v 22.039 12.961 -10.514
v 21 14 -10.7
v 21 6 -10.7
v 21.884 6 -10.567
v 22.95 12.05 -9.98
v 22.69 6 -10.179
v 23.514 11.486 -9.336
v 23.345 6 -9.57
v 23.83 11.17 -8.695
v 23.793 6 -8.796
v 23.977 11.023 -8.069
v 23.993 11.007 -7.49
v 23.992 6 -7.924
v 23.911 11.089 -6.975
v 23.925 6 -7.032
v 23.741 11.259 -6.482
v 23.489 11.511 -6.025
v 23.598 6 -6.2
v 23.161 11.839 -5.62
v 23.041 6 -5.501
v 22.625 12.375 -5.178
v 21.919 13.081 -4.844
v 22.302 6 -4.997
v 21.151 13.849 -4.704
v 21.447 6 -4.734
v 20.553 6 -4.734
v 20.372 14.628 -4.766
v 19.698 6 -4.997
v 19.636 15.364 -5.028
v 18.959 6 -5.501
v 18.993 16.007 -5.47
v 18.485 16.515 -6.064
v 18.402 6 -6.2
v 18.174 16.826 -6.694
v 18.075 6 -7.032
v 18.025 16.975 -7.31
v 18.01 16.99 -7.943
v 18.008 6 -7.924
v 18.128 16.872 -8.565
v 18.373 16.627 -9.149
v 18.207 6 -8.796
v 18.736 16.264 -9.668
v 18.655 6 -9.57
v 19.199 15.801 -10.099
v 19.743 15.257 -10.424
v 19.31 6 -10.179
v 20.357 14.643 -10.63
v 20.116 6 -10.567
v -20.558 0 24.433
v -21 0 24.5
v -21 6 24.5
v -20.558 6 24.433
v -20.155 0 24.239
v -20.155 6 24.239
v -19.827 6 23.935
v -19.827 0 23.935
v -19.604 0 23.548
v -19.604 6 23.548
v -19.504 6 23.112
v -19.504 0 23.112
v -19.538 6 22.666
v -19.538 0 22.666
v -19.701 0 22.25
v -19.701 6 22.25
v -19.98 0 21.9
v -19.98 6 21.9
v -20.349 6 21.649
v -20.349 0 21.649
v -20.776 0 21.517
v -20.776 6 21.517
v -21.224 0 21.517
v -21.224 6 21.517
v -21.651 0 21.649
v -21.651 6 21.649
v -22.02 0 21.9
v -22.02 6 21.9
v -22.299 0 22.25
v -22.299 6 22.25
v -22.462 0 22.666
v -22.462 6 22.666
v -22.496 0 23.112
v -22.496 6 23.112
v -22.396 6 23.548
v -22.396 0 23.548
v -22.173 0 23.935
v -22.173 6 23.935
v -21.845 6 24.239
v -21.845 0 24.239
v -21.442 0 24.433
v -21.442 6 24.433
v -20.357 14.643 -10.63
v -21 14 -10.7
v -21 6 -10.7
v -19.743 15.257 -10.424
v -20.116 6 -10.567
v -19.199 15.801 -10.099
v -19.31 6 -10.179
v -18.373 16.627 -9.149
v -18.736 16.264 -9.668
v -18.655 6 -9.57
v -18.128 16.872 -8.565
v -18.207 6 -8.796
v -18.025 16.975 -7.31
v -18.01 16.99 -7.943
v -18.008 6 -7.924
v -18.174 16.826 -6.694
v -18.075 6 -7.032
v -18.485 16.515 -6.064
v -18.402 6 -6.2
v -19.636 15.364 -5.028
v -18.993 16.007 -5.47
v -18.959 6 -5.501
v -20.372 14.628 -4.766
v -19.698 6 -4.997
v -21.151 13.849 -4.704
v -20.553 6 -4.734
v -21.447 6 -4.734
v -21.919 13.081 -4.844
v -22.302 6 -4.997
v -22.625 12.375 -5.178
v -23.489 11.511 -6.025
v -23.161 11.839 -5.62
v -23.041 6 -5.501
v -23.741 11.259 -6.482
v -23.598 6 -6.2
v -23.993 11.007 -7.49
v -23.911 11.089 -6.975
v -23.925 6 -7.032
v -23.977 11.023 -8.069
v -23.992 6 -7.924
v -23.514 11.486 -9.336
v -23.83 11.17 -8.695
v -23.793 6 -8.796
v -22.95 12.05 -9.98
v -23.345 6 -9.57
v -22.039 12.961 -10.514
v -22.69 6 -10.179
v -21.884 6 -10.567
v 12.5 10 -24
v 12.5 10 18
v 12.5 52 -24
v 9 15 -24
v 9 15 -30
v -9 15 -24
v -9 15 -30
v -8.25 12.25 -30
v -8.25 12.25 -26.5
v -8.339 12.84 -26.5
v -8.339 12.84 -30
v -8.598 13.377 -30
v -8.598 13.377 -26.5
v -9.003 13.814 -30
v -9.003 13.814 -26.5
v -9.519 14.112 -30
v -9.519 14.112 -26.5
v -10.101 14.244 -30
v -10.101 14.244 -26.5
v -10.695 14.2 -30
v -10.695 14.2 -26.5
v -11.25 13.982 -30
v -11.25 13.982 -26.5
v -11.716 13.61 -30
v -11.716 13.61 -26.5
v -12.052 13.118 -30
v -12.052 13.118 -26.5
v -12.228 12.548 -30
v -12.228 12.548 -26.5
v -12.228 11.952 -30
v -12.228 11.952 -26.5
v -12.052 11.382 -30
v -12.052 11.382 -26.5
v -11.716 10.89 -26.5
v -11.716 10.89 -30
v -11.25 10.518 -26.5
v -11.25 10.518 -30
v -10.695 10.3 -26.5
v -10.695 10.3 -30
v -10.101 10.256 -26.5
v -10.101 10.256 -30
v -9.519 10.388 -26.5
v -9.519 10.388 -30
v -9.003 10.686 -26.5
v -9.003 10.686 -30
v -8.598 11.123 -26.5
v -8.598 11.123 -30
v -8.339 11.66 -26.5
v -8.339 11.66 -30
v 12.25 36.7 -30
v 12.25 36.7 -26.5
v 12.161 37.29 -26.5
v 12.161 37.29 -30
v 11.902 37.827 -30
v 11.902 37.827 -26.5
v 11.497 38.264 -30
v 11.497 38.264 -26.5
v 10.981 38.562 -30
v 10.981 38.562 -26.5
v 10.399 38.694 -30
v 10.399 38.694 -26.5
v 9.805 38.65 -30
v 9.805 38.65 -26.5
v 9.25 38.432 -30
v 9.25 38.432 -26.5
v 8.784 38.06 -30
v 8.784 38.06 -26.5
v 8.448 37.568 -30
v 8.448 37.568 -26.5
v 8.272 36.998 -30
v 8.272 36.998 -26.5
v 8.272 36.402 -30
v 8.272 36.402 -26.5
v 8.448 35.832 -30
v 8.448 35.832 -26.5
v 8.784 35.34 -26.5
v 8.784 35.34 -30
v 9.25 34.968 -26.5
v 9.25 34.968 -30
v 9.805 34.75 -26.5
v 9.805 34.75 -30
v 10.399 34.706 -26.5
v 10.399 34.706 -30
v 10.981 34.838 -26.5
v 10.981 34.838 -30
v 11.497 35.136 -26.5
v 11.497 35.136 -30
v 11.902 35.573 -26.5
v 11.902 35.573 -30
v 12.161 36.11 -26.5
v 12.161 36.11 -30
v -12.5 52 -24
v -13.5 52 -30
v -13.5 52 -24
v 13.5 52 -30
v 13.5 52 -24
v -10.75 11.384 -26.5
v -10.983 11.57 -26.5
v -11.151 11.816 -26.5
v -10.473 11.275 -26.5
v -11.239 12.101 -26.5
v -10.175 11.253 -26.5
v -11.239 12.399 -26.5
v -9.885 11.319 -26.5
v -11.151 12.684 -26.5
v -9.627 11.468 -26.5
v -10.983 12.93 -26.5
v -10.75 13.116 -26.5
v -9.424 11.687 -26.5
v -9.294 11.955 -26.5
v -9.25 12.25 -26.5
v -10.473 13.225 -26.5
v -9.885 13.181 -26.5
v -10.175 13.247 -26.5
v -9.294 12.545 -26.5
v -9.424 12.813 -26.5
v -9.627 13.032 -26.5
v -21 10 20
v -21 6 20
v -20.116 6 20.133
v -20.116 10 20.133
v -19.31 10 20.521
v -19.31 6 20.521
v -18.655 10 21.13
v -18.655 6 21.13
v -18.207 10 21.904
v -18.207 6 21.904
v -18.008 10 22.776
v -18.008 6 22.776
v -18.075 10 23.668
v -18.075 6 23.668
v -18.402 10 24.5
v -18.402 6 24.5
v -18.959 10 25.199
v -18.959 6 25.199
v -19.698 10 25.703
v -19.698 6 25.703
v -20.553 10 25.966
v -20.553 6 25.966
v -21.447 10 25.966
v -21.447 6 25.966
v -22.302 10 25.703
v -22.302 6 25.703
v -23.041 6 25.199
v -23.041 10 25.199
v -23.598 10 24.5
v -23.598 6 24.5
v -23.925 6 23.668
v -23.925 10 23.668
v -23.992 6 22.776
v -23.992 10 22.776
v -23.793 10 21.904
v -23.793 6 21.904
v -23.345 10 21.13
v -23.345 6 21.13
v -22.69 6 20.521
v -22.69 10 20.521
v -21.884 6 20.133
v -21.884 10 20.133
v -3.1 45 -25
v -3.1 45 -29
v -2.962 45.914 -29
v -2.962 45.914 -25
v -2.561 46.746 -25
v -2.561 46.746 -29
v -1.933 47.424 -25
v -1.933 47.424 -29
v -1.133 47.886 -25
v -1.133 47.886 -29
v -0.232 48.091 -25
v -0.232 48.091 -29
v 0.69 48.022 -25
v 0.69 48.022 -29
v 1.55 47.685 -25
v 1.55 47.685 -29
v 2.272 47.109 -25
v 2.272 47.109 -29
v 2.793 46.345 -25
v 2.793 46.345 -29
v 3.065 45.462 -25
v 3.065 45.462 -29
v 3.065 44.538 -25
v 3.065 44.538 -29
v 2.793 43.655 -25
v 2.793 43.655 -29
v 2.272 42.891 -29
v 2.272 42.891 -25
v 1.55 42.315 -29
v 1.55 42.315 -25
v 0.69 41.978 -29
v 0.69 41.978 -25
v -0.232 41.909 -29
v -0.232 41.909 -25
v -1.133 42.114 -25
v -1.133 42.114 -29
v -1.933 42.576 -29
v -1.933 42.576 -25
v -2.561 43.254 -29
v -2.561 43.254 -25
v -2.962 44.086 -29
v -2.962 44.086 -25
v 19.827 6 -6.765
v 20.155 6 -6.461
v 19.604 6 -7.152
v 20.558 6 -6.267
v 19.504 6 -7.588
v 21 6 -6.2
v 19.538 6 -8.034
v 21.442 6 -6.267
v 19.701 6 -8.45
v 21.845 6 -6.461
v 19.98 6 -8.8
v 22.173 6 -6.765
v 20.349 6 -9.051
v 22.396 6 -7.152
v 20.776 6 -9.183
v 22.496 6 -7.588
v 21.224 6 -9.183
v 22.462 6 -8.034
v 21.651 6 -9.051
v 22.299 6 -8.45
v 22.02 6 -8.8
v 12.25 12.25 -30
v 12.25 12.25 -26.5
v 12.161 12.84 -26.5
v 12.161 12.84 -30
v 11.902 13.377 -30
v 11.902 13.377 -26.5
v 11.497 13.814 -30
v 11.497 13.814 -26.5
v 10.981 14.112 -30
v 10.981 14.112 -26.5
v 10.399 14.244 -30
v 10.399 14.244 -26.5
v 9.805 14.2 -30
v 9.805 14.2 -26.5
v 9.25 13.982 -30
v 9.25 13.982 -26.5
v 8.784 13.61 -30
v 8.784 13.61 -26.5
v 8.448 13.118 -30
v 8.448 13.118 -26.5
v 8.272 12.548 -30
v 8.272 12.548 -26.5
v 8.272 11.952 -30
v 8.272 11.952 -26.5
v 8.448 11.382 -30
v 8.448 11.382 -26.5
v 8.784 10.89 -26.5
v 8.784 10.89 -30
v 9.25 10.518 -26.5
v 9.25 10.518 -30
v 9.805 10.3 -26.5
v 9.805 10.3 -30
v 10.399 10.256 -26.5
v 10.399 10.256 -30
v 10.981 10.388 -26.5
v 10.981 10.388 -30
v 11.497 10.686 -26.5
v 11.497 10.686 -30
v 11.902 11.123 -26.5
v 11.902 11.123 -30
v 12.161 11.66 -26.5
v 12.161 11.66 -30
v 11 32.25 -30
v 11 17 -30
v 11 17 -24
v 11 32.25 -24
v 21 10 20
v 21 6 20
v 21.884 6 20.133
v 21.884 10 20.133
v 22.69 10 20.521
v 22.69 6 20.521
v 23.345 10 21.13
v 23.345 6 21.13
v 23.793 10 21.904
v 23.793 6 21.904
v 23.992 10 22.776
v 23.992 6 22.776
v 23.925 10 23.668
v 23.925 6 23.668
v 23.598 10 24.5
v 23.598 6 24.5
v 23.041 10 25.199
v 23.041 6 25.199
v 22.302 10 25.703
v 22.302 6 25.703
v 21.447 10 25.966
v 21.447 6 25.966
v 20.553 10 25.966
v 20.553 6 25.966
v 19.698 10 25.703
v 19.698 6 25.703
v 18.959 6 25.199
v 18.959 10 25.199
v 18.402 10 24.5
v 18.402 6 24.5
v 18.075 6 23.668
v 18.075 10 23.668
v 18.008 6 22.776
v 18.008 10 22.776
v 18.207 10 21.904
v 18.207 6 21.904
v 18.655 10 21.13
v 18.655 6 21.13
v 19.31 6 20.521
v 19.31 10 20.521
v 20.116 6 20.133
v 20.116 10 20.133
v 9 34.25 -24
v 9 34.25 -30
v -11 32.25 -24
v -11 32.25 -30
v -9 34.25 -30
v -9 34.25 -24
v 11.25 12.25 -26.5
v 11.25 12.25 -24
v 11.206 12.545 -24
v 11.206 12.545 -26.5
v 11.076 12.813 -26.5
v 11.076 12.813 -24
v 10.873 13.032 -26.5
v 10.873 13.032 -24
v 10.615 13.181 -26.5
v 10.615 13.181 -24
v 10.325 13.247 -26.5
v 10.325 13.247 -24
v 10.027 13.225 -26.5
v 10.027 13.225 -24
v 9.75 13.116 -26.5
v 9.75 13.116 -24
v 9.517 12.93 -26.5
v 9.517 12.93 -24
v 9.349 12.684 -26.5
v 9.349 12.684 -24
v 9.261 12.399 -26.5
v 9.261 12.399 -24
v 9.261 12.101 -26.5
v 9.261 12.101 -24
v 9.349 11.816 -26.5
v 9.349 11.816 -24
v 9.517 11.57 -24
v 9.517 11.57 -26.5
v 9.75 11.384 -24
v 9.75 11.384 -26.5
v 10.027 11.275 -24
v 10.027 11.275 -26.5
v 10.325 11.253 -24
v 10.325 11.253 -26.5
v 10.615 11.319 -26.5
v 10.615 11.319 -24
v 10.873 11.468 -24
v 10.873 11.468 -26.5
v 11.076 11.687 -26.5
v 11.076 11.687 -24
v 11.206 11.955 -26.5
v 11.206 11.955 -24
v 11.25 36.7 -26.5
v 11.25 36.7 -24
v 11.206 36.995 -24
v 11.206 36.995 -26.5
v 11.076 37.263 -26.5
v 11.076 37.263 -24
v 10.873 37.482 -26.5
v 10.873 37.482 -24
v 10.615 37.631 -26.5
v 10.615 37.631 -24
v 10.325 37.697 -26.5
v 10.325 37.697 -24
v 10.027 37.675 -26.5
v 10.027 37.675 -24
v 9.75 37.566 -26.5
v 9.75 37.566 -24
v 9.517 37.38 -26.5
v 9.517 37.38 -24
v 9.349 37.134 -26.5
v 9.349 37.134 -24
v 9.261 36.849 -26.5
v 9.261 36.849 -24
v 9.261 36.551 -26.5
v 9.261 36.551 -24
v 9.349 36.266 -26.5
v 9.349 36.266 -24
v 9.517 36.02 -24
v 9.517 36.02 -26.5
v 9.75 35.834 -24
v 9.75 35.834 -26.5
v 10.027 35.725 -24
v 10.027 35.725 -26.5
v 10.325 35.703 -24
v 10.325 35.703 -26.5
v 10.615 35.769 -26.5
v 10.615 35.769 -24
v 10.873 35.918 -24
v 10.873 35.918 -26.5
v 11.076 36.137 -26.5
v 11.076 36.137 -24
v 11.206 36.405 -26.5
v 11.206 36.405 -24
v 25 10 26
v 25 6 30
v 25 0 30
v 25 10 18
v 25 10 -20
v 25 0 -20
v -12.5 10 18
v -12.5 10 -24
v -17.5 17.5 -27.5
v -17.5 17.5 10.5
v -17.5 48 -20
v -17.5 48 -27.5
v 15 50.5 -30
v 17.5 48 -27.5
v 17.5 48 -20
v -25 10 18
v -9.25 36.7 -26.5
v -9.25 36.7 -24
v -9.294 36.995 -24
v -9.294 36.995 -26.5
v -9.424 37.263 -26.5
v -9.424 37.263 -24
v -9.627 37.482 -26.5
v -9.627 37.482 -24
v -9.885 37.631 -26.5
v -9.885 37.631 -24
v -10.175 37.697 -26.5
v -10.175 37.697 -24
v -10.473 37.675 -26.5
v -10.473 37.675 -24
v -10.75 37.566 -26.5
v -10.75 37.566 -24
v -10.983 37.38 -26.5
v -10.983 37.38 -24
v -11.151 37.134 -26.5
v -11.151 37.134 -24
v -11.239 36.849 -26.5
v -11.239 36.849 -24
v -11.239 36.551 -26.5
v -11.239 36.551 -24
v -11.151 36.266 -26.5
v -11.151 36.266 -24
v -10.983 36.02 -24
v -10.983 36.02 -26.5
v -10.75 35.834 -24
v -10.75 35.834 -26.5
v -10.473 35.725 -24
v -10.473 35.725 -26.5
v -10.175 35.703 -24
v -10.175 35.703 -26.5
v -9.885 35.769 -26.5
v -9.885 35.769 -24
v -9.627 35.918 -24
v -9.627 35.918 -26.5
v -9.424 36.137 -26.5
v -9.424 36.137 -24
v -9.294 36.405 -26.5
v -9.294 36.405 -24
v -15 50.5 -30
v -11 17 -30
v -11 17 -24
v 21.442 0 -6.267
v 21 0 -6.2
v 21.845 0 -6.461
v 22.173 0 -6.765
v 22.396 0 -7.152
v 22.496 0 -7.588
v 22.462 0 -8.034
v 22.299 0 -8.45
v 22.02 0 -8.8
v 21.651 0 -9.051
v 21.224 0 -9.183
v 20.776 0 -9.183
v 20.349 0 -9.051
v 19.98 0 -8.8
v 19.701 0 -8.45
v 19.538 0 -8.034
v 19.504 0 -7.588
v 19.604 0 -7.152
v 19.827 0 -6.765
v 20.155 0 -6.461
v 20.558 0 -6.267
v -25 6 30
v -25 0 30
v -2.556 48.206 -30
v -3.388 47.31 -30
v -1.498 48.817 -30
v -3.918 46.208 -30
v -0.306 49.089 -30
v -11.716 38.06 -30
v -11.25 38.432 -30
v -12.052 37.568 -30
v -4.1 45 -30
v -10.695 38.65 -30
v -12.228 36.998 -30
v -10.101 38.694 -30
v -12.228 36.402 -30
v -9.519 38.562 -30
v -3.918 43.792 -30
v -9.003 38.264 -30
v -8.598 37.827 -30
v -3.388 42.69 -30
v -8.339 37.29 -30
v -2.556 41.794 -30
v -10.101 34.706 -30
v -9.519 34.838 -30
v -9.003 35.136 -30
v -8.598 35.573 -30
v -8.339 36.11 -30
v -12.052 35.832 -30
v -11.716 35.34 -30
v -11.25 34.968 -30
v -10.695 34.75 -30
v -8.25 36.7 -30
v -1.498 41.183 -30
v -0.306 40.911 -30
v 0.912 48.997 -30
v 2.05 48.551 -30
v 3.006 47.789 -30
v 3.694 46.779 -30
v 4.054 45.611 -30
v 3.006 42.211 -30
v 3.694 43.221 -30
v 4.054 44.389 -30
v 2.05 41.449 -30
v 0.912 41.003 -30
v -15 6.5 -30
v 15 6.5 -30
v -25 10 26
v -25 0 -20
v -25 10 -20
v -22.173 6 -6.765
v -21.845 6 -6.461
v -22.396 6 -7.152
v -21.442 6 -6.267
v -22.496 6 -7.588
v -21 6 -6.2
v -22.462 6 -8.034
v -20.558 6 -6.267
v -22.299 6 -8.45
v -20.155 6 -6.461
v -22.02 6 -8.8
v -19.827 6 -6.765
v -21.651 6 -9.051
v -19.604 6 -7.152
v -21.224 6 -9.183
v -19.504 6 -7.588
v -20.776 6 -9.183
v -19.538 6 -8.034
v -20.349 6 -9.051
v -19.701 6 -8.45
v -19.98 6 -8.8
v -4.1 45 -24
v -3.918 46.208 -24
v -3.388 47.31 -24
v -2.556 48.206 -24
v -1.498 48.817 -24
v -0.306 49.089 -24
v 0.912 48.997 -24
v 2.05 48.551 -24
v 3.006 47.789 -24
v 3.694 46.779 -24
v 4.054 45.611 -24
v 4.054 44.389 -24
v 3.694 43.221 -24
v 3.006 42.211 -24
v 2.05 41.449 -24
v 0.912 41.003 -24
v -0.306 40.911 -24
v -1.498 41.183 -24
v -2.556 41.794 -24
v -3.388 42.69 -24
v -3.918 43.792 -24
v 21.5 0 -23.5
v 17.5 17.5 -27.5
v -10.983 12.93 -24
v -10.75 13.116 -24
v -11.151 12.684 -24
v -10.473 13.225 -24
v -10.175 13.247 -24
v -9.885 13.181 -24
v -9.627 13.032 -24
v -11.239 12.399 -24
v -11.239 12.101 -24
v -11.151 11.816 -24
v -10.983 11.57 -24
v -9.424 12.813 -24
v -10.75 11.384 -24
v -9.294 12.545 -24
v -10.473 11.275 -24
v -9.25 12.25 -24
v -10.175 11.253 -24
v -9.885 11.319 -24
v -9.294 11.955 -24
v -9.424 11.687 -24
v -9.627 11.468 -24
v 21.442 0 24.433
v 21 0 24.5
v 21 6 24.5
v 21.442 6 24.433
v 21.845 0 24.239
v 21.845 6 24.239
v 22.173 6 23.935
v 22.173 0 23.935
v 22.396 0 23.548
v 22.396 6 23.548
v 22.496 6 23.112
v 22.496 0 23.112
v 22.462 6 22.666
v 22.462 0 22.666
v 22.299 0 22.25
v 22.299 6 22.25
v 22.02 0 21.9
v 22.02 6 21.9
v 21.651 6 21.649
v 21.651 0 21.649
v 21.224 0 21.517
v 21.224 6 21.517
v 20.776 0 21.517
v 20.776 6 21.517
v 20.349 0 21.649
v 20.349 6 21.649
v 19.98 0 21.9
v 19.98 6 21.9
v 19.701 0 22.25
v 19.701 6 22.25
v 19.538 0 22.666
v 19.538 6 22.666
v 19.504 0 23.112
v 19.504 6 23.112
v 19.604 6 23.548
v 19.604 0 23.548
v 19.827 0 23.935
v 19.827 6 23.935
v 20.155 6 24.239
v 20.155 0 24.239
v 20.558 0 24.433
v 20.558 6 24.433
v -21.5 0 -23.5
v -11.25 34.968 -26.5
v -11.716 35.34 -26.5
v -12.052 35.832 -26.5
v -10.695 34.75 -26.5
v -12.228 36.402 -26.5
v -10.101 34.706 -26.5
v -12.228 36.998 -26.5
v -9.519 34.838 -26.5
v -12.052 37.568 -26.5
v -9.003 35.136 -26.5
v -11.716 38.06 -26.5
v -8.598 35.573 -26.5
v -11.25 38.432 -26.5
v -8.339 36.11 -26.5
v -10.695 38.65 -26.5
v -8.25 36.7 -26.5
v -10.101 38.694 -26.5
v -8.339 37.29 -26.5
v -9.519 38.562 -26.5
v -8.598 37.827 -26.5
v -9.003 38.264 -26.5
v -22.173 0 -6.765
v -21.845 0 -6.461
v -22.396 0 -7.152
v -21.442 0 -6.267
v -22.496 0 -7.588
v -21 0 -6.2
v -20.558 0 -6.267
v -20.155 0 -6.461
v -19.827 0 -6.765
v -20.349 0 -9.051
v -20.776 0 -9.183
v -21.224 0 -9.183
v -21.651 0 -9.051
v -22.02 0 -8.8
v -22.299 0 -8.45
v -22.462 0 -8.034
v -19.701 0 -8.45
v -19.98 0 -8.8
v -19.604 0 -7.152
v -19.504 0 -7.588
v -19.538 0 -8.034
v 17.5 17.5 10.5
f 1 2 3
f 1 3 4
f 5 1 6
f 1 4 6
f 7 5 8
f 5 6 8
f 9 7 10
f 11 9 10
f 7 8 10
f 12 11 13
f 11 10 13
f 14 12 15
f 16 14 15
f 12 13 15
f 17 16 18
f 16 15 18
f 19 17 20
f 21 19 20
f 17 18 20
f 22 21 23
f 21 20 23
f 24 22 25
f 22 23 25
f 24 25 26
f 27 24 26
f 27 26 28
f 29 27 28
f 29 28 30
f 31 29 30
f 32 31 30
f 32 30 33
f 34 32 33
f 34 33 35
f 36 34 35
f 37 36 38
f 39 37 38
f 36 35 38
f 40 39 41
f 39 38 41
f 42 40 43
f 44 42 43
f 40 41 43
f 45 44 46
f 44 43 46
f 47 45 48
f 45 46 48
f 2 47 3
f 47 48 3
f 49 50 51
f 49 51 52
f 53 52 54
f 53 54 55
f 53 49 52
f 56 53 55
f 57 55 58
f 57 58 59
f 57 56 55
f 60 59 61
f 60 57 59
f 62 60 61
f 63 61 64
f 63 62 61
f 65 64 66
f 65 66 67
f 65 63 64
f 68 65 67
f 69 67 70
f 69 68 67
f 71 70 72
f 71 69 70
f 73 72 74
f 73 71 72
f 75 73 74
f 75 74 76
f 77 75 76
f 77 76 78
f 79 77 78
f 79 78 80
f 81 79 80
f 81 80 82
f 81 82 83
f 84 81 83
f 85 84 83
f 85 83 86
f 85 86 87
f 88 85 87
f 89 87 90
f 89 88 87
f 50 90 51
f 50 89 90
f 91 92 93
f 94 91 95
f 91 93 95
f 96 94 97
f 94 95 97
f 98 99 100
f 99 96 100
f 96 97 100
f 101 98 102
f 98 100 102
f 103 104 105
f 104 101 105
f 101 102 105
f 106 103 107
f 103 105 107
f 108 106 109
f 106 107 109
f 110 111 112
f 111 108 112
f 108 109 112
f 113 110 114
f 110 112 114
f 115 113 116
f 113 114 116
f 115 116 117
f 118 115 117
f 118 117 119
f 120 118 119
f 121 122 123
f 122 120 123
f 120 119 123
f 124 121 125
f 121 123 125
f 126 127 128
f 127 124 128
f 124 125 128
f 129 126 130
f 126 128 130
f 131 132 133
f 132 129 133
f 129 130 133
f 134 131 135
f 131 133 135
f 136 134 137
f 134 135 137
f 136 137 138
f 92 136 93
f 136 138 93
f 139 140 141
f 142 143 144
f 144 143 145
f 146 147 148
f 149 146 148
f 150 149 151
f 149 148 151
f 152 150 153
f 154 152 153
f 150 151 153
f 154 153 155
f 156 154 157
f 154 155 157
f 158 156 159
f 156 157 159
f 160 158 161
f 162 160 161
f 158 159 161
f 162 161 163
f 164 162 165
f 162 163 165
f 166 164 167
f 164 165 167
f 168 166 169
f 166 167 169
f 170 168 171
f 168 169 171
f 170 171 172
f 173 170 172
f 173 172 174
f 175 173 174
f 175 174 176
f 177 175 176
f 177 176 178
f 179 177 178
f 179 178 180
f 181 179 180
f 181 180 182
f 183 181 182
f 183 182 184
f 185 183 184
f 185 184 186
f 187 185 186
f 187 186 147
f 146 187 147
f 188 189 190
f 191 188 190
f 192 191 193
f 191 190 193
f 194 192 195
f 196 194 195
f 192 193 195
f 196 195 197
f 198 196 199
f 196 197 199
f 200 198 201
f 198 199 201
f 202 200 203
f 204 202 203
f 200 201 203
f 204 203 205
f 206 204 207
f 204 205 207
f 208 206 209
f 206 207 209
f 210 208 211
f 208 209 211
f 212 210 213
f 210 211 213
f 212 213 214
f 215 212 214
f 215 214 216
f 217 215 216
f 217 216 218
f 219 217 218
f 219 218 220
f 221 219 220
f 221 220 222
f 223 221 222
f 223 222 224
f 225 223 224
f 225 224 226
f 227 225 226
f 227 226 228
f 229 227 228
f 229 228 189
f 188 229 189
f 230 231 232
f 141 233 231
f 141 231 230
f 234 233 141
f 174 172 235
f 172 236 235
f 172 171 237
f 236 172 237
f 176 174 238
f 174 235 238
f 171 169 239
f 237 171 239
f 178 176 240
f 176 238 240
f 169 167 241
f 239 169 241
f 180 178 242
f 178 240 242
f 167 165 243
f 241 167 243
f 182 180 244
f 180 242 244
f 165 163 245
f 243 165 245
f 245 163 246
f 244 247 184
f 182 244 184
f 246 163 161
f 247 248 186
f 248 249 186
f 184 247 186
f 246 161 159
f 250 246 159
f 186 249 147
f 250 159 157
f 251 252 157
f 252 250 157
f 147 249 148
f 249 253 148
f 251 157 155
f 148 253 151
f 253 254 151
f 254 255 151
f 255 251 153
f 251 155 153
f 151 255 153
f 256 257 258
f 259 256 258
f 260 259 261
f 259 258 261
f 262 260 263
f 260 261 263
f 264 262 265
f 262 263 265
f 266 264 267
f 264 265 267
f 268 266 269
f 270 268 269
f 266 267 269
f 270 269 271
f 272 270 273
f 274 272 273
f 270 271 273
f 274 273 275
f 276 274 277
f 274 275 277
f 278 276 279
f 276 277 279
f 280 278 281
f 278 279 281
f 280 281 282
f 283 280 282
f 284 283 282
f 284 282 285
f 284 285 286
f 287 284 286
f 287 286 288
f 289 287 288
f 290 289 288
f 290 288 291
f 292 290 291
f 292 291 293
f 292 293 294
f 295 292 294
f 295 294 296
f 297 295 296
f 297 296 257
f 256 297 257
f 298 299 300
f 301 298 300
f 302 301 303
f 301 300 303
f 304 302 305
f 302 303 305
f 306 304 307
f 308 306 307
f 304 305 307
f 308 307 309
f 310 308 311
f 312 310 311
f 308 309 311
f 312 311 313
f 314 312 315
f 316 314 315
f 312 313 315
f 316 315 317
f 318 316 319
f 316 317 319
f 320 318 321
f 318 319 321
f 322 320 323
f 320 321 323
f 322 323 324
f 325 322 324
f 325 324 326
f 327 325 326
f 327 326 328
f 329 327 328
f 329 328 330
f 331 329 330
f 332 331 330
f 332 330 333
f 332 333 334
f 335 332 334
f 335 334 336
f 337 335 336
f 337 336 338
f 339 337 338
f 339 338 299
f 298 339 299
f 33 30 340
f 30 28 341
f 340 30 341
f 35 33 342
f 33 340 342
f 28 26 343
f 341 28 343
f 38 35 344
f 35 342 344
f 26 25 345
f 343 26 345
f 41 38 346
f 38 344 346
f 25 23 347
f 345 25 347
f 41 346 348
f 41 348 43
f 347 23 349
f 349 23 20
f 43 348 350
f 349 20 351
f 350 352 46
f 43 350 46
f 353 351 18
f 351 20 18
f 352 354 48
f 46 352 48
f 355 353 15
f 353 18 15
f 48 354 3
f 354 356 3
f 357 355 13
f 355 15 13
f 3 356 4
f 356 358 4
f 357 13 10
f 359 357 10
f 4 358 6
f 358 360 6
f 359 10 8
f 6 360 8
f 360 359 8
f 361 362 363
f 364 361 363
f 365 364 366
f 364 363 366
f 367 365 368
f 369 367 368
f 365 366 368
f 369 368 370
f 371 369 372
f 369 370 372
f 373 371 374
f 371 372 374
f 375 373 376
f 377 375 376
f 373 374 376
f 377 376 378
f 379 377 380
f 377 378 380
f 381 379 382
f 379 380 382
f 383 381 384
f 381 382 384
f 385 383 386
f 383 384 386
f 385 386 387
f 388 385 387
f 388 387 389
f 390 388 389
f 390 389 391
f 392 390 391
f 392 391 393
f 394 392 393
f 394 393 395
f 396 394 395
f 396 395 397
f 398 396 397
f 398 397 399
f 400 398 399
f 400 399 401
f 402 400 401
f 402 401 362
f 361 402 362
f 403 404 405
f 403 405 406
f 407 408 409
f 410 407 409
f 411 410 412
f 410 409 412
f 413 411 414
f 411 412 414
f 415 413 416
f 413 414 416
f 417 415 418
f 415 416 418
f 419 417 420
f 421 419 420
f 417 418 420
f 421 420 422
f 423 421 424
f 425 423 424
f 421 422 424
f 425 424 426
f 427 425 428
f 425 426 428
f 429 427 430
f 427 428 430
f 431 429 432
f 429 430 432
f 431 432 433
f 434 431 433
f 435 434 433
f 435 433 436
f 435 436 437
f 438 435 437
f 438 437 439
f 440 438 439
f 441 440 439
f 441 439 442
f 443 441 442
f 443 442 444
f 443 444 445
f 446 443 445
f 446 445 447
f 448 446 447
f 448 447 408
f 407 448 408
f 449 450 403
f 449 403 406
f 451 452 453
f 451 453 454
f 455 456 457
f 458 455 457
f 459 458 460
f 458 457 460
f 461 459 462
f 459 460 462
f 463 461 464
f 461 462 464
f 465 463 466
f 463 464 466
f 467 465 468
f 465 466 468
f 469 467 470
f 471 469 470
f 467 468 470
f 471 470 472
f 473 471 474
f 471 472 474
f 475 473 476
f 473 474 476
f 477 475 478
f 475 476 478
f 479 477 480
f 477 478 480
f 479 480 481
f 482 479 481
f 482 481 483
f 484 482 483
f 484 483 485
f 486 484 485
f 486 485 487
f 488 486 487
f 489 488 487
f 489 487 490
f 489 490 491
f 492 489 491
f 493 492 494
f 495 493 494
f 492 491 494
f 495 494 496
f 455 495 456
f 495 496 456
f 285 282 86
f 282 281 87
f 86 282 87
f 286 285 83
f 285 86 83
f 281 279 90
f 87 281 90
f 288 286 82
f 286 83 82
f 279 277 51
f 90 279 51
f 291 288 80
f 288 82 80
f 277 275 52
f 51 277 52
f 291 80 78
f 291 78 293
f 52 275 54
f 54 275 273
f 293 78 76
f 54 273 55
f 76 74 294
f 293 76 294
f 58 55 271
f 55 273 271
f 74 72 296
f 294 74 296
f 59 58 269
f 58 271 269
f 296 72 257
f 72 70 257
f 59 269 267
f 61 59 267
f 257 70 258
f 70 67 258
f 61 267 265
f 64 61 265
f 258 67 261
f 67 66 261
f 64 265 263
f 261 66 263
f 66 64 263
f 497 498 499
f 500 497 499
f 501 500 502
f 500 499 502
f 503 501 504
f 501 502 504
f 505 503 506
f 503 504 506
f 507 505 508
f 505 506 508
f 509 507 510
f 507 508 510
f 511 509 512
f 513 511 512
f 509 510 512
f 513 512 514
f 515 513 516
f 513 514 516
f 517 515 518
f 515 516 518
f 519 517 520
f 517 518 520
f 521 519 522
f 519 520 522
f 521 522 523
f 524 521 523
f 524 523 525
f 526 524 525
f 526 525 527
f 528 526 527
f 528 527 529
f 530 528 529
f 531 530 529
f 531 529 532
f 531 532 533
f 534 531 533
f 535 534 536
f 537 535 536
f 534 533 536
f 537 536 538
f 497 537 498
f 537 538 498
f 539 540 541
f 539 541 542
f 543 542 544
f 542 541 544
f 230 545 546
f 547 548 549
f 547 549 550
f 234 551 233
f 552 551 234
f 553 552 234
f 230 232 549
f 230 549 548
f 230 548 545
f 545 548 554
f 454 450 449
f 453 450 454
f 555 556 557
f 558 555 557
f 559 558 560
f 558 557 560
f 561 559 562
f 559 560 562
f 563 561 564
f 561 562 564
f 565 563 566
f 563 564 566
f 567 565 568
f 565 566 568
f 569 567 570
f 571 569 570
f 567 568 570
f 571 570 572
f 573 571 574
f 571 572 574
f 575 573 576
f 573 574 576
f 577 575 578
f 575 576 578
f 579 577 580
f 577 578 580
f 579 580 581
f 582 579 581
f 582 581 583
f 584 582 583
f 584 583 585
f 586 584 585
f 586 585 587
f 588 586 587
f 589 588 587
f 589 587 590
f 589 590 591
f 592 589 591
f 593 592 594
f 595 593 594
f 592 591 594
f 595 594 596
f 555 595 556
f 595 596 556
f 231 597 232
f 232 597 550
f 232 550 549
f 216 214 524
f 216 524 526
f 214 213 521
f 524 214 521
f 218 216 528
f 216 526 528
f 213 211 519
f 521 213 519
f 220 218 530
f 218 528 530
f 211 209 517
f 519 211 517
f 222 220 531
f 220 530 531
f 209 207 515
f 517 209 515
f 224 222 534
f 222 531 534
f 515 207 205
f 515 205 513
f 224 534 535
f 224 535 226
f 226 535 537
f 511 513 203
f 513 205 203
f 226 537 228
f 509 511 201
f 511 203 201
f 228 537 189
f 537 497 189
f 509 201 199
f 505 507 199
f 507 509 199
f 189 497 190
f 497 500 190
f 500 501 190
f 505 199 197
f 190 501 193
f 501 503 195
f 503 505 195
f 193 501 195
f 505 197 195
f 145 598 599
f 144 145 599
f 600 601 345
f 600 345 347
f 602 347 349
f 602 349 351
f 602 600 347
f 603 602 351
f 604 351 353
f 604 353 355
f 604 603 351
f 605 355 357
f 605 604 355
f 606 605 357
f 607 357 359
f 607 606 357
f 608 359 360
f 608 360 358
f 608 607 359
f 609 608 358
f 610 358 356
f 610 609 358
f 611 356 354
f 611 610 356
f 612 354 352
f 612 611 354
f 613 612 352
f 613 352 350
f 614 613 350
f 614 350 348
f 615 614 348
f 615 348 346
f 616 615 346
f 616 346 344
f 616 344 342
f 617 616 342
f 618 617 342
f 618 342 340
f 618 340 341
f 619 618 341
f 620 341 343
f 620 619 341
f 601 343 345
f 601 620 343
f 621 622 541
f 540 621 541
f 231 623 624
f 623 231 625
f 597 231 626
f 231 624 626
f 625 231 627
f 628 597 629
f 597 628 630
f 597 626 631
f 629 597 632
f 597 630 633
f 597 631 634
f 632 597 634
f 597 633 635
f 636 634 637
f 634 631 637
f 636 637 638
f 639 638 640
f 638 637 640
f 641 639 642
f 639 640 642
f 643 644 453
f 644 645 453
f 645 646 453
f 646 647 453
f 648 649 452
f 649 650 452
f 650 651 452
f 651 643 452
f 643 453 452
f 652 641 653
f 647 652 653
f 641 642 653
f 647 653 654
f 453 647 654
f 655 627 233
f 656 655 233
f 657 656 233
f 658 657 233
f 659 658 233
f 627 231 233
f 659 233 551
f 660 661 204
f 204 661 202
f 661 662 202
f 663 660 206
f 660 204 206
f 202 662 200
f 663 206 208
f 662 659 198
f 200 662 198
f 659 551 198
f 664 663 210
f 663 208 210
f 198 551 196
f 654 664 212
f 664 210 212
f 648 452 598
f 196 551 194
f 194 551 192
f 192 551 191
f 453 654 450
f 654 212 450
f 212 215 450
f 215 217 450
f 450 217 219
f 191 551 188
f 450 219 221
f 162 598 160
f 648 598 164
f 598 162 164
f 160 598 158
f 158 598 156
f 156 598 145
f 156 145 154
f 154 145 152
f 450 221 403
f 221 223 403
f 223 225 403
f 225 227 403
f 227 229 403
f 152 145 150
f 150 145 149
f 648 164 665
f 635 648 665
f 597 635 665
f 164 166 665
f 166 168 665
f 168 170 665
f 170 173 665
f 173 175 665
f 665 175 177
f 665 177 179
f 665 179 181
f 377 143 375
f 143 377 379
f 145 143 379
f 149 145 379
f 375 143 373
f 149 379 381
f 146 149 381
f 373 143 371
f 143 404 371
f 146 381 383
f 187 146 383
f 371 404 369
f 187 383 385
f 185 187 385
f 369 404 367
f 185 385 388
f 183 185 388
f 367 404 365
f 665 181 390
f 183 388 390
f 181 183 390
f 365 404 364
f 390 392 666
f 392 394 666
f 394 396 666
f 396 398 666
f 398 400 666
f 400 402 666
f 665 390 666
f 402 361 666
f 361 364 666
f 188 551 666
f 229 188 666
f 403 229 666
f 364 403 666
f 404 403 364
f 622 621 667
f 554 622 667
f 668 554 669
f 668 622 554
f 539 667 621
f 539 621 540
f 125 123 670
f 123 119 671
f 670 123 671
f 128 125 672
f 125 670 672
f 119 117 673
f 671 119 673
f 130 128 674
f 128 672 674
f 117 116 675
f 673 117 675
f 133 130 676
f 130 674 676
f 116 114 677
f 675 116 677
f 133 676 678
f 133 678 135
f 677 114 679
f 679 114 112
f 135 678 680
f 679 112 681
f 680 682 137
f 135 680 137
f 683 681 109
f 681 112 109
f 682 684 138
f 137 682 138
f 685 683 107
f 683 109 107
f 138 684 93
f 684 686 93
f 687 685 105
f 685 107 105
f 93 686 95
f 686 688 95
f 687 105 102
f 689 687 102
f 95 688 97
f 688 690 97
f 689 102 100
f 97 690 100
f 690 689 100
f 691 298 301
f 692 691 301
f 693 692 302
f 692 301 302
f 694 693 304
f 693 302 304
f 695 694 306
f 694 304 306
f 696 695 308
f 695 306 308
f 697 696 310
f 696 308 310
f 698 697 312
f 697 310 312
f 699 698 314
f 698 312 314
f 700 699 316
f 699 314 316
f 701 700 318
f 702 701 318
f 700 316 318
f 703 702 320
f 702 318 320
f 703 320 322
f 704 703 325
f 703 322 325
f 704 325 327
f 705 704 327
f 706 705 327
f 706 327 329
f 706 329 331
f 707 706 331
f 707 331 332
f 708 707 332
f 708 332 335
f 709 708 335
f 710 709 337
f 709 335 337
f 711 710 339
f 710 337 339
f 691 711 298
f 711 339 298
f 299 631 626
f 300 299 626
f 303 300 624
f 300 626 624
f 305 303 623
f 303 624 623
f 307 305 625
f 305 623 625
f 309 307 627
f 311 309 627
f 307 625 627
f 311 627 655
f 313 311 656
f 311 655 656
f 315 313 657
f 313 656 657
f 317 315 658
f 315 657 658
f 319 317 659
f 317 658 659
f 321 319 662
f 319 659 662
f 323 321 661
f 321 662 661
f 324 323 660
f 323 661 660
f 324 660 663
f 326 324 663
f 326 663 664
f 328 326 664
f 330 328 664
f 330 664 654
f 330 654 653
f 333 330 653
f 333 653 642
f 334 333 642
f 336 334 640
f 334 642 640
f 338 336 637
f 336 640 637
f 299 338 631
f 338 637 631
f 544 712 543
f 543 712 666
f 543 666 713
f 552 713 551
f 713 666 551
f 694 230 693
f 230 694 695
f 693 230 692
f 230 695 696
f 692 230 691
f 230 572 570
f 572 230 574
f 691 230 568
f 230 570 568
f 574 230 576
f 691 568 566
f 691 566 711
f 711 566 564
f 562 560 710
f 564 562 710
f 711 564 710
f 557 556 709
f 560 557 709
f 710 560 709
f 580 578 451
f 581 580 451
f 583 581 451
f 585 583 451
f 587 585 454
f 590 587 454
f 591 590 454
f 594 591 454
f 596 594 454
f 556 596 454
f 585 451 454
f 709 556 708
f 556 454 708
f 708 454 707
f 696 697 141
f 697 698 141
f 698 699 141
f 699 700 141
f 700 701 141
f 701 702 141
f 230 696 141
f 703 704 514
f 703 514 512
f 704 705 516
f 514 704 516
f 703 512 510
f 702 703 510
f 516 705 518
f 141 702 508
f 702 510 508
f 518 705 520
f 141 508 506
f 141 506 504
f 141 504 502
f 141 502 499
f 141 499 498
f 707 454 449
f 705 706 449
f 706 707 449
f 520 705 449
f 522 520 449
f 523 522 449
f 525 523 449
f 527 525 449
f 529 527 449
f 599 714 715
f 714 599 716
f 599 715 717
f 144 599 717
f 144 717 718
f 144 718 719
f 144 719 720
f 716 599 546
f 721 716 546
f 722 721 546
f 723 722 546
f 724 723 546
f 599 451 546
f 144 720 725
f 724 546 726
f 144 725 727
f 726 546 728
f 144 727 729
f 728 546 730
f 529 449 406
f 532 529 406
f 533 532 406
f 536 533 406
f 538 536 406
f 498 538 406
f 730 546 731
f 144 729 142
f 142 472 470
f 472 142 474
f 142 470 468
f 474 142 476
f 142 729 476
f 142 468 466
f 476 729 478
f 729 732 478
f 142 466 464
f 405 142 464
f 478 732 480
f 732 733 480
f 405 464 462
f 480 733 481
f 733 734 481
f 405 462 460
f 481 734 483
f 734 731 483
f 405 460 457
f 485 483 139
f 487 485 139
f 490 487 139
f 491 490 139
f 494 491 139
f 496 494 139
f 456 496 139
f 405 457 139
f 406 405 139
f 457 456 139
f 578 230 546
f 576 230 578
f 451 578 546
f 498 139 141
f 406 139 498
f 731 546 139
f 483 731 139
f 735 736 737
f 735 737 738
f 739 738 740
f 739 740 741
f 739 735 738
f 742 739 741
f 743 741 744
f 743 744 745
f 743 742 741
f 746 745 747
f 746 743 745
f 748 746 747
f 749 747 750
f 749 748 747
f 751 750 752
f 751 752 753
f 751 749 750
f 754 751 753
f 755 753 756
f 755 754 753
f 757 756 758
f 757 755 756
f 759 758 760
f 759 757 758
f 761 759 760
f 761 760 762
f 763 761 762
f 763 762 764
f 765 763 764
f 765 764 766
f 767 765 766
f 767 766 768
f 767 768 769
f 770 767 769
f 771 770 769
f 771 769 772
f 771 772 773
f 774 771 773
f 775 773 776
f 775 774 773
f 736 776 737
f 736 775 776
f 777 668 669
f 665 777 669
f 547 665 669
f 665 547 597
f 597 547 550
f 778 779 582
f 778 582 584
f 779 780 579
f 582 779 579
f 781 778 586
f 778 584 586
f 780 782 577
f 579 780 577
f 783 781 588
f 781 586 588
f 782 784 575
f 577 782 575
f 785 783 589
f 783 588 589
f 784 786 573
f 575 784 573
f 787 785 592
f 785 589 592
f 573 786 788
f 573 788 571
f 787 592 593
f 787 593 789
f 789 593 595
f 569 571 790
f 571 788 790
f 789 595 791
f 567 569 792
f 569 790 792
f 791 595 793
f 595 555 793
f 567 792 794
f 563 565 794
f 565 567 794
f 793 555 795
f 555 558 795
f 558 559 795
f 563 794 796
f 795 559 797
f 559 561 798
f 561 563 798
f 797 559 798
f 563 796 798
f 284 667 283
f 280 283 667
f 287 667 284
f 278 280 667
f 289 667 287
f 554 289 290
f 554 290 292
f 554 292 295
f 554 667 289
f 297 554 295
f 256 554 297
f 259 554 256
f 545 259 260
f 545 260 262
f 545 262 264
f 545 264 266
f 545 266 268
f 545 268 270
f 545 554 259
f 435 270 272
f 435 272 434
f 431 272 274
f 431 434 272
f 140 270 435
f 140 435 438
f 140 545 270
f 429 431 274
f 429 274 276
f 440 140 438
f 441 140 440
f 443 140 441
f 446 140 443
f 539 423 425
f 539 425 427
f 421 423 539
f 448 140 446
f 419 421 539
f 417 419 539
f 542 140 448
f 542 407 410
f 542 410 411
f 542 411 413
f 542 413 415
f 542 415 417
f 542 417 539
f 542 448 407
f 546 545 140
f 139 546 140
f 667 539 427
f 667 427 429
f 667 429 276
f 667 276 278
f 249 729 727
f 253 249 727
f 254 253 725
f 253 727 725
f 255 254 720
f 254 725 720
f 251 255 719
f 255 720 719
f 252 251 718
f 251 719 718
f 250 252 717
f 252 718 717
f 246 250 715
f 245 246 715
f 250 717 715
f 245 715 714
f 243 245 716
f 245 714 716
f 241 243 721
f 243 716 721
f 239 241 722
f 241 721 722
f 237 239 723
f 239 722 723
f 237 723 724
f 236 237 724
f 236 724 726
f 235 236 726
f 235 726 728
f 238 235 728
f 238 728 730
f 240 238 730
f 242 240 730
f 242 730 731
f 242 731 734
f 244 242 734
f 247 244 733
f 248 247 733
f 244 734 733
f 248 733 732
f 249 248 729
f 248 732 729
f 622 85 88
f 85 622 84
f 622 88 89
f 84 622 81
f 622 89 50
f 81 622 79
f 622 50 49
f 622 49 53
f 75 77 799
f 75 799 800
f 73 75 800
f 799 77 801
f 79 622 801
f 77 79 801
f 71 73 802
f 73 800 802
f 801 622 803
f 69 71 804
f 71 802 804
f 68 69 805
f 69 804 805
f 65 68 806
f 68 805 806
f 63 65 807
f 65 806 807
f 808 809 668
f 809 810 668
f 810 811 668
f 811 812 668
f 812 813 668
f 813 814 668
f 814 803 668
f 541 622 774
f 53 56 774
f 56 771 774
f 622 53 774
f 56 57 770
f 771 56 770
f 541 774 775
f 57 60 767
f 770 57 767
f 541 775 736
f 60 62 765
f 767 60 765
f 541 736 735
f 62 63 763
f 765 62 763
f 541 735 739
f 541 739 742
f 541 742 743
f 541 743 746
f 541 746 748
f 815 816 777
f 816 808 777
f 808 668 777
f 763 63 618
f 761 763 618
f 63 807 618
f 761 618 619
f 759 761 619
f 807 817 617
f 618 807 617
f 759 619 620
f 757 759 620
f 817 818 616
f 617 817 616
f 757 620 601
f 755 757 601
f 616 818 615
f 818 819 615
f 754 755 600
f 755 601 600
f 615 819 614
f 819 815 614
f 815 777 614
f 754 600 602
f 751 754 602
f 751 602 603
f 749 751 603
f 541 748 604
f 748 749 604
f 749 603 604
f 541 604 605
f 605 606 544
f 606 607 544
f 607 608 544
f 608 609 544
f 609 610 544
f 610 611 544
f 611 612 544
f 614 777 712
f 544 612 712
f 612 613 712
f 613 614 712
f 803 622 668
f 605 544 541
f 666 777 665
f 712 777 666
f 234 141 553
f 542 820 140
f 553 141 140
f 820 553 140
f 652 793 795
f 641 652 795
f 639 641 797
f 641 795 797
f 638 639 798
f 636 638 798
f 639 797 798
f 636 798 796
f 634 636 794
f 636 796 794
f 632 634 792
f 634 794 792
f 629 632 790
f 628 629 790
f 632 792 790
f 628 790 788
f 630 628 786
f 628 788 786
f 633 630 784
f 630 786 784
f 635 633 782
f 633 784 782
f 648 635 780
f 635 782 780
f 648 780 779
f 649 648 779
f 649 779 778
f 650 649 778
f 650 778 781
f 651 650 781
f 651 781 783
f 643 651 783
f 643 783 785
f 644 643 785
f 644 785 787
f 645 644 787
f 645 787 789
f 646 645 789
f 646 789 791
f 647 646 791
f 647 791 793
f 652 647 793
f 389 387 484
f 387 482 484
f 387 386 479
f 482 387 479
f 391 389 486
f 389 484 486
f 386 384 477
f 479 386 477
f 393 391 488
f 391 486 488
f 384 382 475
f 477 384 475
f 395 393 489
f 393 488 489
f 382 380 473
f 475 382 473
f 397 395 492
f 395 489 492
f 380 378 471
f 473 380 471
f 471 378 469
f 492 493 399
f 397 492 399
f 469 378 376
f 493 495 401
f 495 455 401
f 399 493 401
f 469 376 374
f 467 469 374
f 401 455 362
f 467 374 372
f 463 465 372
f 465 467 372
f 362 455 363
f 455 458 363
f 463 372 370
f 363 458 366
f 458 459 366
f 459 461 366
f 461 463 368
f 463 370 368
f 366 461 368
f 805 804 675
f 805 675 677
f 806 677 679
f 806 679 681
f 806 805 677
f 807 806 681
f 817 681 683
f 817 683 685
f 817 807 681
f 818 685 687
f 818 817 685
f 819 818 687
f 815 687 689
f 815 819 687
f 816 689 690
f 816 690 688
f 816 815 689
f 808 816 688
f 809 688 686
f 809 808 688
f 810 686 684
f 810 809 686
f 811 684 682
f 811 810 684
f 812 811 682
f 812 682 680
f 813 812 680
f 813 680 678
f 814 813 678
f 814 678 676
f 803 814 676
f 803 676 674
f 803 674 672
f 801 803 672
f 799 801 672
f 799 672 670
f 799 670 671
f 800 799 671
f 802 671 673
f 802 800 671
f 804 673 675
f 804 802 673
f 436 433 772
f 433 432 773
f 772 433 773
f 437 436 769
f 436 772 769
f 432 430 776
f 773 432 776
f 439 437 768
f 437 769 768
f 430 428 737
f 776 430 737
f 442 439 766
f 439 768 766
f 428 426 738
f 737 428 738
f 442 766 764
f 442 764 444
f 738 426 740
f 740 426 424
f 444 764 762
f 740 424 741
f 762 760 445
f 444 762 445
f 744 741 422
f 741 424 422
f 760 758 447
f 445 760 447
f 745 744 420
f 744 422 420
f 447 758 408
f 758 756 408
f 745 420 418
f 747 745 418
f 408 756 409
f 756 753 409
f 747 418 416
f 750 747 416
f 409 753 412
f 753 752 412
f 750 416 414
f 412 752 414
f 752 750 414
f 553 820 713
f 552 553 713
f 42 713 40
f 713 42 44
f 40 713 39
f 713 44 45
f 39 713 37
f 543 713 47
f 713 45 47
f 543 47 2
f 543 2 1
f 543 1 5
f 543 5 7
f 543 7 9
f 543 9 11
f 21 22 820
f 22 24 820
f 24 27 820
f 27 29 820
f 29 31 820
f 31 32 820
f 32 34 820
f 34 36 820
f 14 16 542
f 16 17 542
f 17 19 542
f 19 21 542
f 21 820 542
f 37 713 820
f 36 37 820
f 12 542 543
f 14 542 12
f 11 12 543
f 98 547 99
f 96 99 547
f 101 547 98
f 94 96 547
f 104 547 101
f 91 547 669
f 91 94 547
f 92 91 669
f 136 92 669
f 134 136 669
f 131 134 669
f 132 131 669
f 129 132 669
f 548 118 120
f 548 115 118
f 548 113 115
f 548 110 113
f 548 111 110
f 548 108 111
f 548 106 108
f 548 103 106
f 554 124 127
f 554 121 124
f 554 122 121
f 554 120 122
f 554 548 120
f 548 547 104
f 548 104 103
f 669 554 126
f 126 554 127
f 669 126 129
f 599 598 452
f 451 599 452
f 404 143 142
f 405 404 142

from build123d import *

# Parameters (mm, degrees)
SKETCH1_W           = 50
SKETCH1_H           = 60
BOSS_EXTRUDE1_DEPTH = 10
SKETCH2_R           = 1.5
CUT_EXTRUDE1_DEPTH  = 6
CUT_EXTRUDE2_REACH  = 41.509
SKETCH3_R           = 3
SKETCH5_W           = 25
SKETCH5_H           = 6
BOSS_EXTRUDE3_DEPTH = 42
CUT_EXTRUDE3_REACH  = 85.241
SKETCH6_W           = 22
SKETCH6_H           = 19.25
SKETCH7_R           = 1
CUT_EXTRUDE4_DEPTH  = 2.5
CUT_EXTRUDE5_REACH  = 82.754
SKETCH8_R           = 2
BOSS_EXTRUDE4_DEPTH = 5
CHAMFER1_SIZE       = 7.5
CHAMFER2_SIZE       = 10
CHAMFER4_SIZE       = 6.5
CHAMFER5_SIZE       = 4
CHAMFER6_SIZE       = 4
CHAMFER7_SIZE       = 2
CUT_EXTRUDE6_REACH  = 85.241
SKETCH10_R          = 3.1
CHAMFER8_SIZE       = 1


# Some blends are built 0.0001 mm under size
with BuildPart() as part:
    # Sketch1 → Boss-Extrude1 (new body)
    with BuildSketch(Plane(origin=(0, 0, 0), x_dir=(1, 0, 0), z_dir=(0, 1, 0))):
        Rectangle(SKETCH1_W, SKETCH1_H)
    extrude(amount=BOSS_EXTRUDE1_DEPTH)

    # Sketch2 → Cut-Extrude1 (cut)
    with BuildSketch(Plane(origin=(0, 0, 0), x_dir=(1, 0, 0), z_dir=(0, 1, 0))):
        with Locations(Location((-21, 7.7, 0), (0, 0, 270))):
            Circle(SKETCH2_R)
        with Locations(Location((-21, -23, 0), (0, 0, 270))):
            Circle(SKETCH2_R)
        with Locations(Location((21, 7.7, 0), (0, 0, 270))):
            Circle(SKETCH2_R)
        with Locations(Location((21, -23, 0), (0, 0, 270))):
            Circle(SKETCH2_R)
    extrude(amount=CUT_EXTRUDE1_DEPTH, mode=Mode.SUBTRACT)

    # Sketch3 → Cut-Extrude2 (cut, up to next)
    with BuildSketch(Plane.XZ.offset(-6), mode=Mode.PRIVATE) as cut_extrude2_sk1:
        with Locations(Location((-21, 23, 0), (0, 0, 270))):
            Circle(SKETCH3_R)
    cut_extrude2_tool1 = extrude(cut_extrude2_sk1.sketch, amount=-CUT_EXTRUDE2_REACH, mode=Mode.PRIVATE) & part.part
    # Sketch3 → Cut-Extrude2 (cut, up to next)
    with BuildSketch(Plane.XZ.offset(-6), mode=Mode.PRIVATE) as cut_extrude2_sk2:
        with Locations(Location((21, 23, 0), (0, 0, 270))):
            Circle(SKETCH3_R)
    cut_extrude2_tool2 = extrude(cut_extrude2_sk2.sketch, amount=-CUT_EXTRUDE2_REACH, mode=Mode.PRIVATE) & part.part
    # Sketch3 → Cut-Extrude2 (cut, up to next)
    with BuildSketch(Plane.XZ.offset(-6), mode=Mode.PRIVATE) as cut_extrude2_sk3:
        with Locations(Location((21, -7.7, 0), (0, 0, 270))):
            Circle(SKETCH3_R)
    cut_extrude2_tool3 = extrude(cut_extrude2_sk3.sketch, amount=-CUT_EXTRUDE2_REACH, mode=Mode.PRIVATE) & part.part
    # Sketch3 → Cut-Extrude2 (cut, up to next)
    with BuildSketch(Plane.XZ.offset(-6), mode=Mode.PRIVATE) as cut_extrude2_sk4:
        with Locations(Location((-21, -7.7, 0), (0, 0, 270))):
            Circle(SKETCH3_R)
    cut_extrude2_tool4 = extrude(cut_extrude2_sk4.sketch, amount=-CUT_EXTRUDE2_REACH, mode=Mode.PRIVATE) & part.part
    add(cut_extrude2_tool1.solids().sort_by_distance((-21, 6, 23))[0], mode=Mode.SUBTRACT)
    add(cut_extrude2_tool2.solids().sort_by_distance((21, 6, 23))[0], mode=Mode.SUBTRACT)
    add(cut_extrude2_tool3.solids().sort_by_distance((21, 6, -7.7))[0], mode=Mode.SUBTRACT)
    add(cut_extrude2_tool4.solids().sort_by_distance((-21, 6, -7.7))[0], mode=Mode.SUBTRACT)

    # Sketch5 → Boss-Extrude3 (add)
    with BuildSketch(Plane(origin=(0, 10, 0), x_dir=(1, 0, 0), z_dir=(0, 1, 0))):
        with Locations((0, 27)):
            Rectangle(SKETCH5_W, SKETCH5_H)
    extrude(amount=BOSS_EXTRUDE3_DEPTH)

    # Sketch6 → Cut-Extrude3 (cut, up to next)
    with BuildSketch(Plane(origin=(0, 0, -30), x_dir=(-1, 0, 0), z_dir=(0, 0, -1)), mode=Mode.PRIVATE) as cut_extrude3_sk1:
        with Locations((0, 24.625)):
            Rectangle(SKETCH6_W, SKETCH6_H)
    cut_extrude3_tool1 = extrude(cut_extrude3_sk1.sketch, amount=-CUT_EXTRUDE3_REACH, mode=Mode.PRIVATE) & part.part
    add(cut_extrude3_tool1.solids().sort_by_distance((0, 24.625, -30))[0], mode=Mode.SUBTRACT)

    # Sketch7 → Cut-Extrude4 (cut)
    with BuildSketch(Plane.XY.offset(-24)):
        with Locations((10.25, 12.25)):
            Circle(SKETCH7_R)
        with Locations((-10.25, 12.25)):
            Circle(SKETCH7_R)
        with Locations((-10.25, 36.7)):
            Circle(SKETCH7_R)
        with Locations((10.25, 36.7)):
            Circle(SKETCH7_R)
    extrude(amount=-CUT_EXTRUDE4_DEPTH, mode=Mode.SUBTRACT)

    # Sketch8 → Cut-Extrude5 (cut, up to next)
    with BuildSketch(Plane.XY.offset(-26.5), mode=Mode.PRIVATE) as cut_extrude5_sk1:
        with Locations((-10.25, 36.7)):
            Circle(SKETCH8_R)
    cut_extrude5_tool1 = extrude(cut_extrude5_sk1.sketch, amount=-CUT_EXTRUDE5_REACH, mode=Mode.PRIVATE) & part.part
    # Sketch8 → Cut-Extrude5 (cut, up to next)
    with BuildSketch(Plane.XY.offset(-26.5), mode=Mode.PRIVATE) as cut_extrude5_sk2:
        with Locations((10.25, 36.7)):
            Circle(SKETCH8_R)
    cut_extrude5_tool2 = extrude(cut_extrude5_sk2.sketch, amount=-CUT_EXTRUDE5_REACH, mode=Mode.PRIVATE) & part.part
    # Sketch8 → Cut-Extrude5 (cut, up to next)
    with BuildSketch(Plane.XY.offset(-26.5), mode=Mode.PRIVATE) as cut_extrude5_sk3:
        with Locations((10.25, 12.25)):
            Circle(SKETCH8_R)
    cut_extrude5_tool3 = extrude(cut_extrude5_sk3.sketch, amount=-CUT_EXTRUDE5_REACH, mode=Mode.PRIVATE) & part.part
    # Sketch8 → Cut-Extrude5 (cut, up to next)
    with BuildSketch(Plane.XY.offset(-26.5), mode=Mode.PRIVATE) as cut_extrude5_sk4:
        with Locations((-10.25, 12.25)):
            Circle(SKETCH8_R)
    cut_extrude5_tool4 = extrude(cut_extrude5_sk4.sketch, amount=-CUT_EXTRUDE5_REACH, mode=Mode.PRIVATE) & part.part
    add(cut_extrude5_tool1.solids().sort_by_distance((-10.25, 36.7, -26.5))[0], mode=Mode.SUBTRACT)
    add(cut_extrude5_tool2.solids().sort_by_distance((10.25, 36.7, -26.5))[0], mode=Mode.SUBTRACT)
    add(cut_extrude5_tool3.solids().sort_by_distance((10.25, 12.25, -26.5))[0], mode=Mode.SUBTRACT)
    add(cut_extrude5_tool4.solids().sort_by_distance((-10.25, 12.25, -26.5))[0], mode=Mode.SUBTRACT)

    # Sketch9 → Boss-Extrude4 (add)
    with BuildSketch(Plane(origin=(12.5, 0, 0), x_dir=(0, 0, -1), z_dir=(1, 0, 0))):
        Polygon((30, 52), (24, 52), (-18, 10), (30, 10), align=None)
    boss_extrude4 = extrude(amount=BOSS_EXTRUDE4_DEPTH)

    # Mirror1: Boss-Extrude4 across plane
    add(boss_extrude4.mirror(Plane(origin=(0, 0, 0), x_dir=(0, 0, 1), z_dir=(1, 0, 0))))

    # Chamfer1
    # the kernel refuses this chamfer: 7.5 mm, written as the material it adds along each edge
    with BuildSketch(Plane(origin=(17.5, 10, 37.28762241), x_dir=(-0.02749587661058632, 0.9996219169112968, 0), z_dir=(0, 0, -1))) as chamfer1_piece_1_section:
        Polygon((CHAMFER1_SIZE * 0.999621916911, CHAMFER1_SIZE * 0.0274958766106), (-CHAMFER1_SIZE * 0.0274958766106, CHAMFER1_SIZE * 0.999621916911), (0, 0), align=None)
    chamfer1_piece_1 = extrude(amount=67.28762241, mode=Mode.PRIVATE)
    chamfer1_piece_1 = split(chamfer1_piece_1, bisect_by=Plane(origin=(18.496268946, 33.174911168, -5.174911168), z_dir=(0, -0.7071067811865462, -0.7071067811865489)), keep=Keep.TOP, mode=Mode.PRIVATE)
    chamfer1_piece_1 = chamfer1_piece_1 - Plane(origin=(21, 16.349822336, -7.7), x_dir=(0, 0, -1), z_dir=(0, -1, 0)) * Cylinder(3, 165, mode=Mode.PRIVATE)
    chamfer1_piece_1 = split(chamfer1_piece_1, bisect_by=Plane(origin=(25, 16.349822336, -22), z_dir=(-1, 0, 0)), keep=Keep.TOP, mode=Mode.PRIVATE)
    add(chamfer1_piece_1)
    with BuildSketch(Plane(origin=(-17.5, 10, 37.28762241), x_dir=(0.02749587661058632, 0.9996219169112968, 0), z_dir=(0, 0, -1))) as chamfer1_piece_2_section:
        Polygon((CHAMFER1_SIZE * 0.999621916911, -CHAMFER1_SIZE * 0.0274958766106), (-CHAMFER1_SIZE * 0.0274958766106, -CHAMFER1_SIZE * 0.999621916911), (0, 0), align=None)
    chamfer1_piece_2 = extrude(amount=67.28762241, mode=Mode.PRIVATE)
    chamfer1_piece_2 = split(chamfer1_piece_2, bisect_by=Plane(origin=(-18.49626887, 33.174911131, -5.174911131), z_dir=(0, -0.7071067811865462, -0.7071067811865489)), keep=Keep.TOP, mode=Mode.PRIVATE)
    chamfer1_piece_2 = chamfer1_piece_2 - Plane(origin=(-21, 16.349822261, -7.7), x_dir=(0, 0, -1), z_dir=(0, -1, 0)) * Cylinder(3, 165, mode=Mode.PRIVATE)
    chamfer1_piece_2 = split(chamfer1_piece_2, bisect_by=Plane(origin=(-25, 16.349822261, -22), z_dir=(1, 0, 0)), keep=Keep.TOP, mode=Mode.PRIVATE)
    add(chamfer1_piece_2)

    # Chamfer2
    chamfer2_edges = [part.edges().sort_by_distance(p)[0] for p in [
        (-25, 5, -30),
        (25, 5, -30),
    ]]
    chamfer(chamfer2_edges, length=CHAMFER2_SIZE)

    # Chamfer4
    chamfer4_edges = [part.edges().sort_by_distance(p)[0] for p in [
        (0, 0, -30),
    ]]
    chamfer(chamfer4_edges, length=CHAMFER4_SIZE)

    # Chamfer5
    chamfer5_edges = [part.edges().sort_by_distance(p)[0] for p in [
        (17.5, 52, -25.75),
        (-17.5, 52, -25.75),
    ]]
    chamfer(chamfer5_edges, length=CHAMFER5_SIZE)

    # Chamfer6
    chamfer6_edges = [part.edges().sort_by_distance(p)[0] for p in [
        (0, 10, 30),
    ]]
    chamfer(chamfer6_edges, length=CHAMFER6_SIZE - 0.0001)  # a hair under: the kernel refuses the full size

    # Chamfer7
    chamfer7_edges = [part.edges().sort_by_distance(p)[0] for p in [
        (-11, 34.25, -27),
        (-11, 15, -27),
        (11, 15, -27),
        (11, 34.25, -27),
    ]]
    chamfer(chamfer7_edges, length=CHAMFER7_SIZE)

    # Sketch10 → Cut-Extrude6 (cut, up to next)
    with BuildSketch(Plane(origin=(0, 0, -30), x_dir=(-1, 0, 0), z_dir=(0, 0, -1)), mode=Mode.PRIVATE) as cut_extrude6_sk1:
        with Locations((0, 45)):
            Circle(SKETCH10_R)
    cut_extrude6_tool1 = extrude(cut_extrude6_sk1.sketch, amount=-CUT_EXTRUDE6_REACH, mode=Mode.PRIVATE) & part.part
    add(cut_extrude6_tool1.solids().sort_by_distance((0, 45, -30))[0], mode=Mode.SUBTRACT)

    # Chamfer8
    chamfer8_edges = [part.edges().sort_by_distance(p)[0] for p in [
        (3.1, 45, -30),
        (3.1, 45, -24),
    ]]
    chamfer(chamfer8_edges, length=CHAMFER8_SIZE)


solid = part.part
